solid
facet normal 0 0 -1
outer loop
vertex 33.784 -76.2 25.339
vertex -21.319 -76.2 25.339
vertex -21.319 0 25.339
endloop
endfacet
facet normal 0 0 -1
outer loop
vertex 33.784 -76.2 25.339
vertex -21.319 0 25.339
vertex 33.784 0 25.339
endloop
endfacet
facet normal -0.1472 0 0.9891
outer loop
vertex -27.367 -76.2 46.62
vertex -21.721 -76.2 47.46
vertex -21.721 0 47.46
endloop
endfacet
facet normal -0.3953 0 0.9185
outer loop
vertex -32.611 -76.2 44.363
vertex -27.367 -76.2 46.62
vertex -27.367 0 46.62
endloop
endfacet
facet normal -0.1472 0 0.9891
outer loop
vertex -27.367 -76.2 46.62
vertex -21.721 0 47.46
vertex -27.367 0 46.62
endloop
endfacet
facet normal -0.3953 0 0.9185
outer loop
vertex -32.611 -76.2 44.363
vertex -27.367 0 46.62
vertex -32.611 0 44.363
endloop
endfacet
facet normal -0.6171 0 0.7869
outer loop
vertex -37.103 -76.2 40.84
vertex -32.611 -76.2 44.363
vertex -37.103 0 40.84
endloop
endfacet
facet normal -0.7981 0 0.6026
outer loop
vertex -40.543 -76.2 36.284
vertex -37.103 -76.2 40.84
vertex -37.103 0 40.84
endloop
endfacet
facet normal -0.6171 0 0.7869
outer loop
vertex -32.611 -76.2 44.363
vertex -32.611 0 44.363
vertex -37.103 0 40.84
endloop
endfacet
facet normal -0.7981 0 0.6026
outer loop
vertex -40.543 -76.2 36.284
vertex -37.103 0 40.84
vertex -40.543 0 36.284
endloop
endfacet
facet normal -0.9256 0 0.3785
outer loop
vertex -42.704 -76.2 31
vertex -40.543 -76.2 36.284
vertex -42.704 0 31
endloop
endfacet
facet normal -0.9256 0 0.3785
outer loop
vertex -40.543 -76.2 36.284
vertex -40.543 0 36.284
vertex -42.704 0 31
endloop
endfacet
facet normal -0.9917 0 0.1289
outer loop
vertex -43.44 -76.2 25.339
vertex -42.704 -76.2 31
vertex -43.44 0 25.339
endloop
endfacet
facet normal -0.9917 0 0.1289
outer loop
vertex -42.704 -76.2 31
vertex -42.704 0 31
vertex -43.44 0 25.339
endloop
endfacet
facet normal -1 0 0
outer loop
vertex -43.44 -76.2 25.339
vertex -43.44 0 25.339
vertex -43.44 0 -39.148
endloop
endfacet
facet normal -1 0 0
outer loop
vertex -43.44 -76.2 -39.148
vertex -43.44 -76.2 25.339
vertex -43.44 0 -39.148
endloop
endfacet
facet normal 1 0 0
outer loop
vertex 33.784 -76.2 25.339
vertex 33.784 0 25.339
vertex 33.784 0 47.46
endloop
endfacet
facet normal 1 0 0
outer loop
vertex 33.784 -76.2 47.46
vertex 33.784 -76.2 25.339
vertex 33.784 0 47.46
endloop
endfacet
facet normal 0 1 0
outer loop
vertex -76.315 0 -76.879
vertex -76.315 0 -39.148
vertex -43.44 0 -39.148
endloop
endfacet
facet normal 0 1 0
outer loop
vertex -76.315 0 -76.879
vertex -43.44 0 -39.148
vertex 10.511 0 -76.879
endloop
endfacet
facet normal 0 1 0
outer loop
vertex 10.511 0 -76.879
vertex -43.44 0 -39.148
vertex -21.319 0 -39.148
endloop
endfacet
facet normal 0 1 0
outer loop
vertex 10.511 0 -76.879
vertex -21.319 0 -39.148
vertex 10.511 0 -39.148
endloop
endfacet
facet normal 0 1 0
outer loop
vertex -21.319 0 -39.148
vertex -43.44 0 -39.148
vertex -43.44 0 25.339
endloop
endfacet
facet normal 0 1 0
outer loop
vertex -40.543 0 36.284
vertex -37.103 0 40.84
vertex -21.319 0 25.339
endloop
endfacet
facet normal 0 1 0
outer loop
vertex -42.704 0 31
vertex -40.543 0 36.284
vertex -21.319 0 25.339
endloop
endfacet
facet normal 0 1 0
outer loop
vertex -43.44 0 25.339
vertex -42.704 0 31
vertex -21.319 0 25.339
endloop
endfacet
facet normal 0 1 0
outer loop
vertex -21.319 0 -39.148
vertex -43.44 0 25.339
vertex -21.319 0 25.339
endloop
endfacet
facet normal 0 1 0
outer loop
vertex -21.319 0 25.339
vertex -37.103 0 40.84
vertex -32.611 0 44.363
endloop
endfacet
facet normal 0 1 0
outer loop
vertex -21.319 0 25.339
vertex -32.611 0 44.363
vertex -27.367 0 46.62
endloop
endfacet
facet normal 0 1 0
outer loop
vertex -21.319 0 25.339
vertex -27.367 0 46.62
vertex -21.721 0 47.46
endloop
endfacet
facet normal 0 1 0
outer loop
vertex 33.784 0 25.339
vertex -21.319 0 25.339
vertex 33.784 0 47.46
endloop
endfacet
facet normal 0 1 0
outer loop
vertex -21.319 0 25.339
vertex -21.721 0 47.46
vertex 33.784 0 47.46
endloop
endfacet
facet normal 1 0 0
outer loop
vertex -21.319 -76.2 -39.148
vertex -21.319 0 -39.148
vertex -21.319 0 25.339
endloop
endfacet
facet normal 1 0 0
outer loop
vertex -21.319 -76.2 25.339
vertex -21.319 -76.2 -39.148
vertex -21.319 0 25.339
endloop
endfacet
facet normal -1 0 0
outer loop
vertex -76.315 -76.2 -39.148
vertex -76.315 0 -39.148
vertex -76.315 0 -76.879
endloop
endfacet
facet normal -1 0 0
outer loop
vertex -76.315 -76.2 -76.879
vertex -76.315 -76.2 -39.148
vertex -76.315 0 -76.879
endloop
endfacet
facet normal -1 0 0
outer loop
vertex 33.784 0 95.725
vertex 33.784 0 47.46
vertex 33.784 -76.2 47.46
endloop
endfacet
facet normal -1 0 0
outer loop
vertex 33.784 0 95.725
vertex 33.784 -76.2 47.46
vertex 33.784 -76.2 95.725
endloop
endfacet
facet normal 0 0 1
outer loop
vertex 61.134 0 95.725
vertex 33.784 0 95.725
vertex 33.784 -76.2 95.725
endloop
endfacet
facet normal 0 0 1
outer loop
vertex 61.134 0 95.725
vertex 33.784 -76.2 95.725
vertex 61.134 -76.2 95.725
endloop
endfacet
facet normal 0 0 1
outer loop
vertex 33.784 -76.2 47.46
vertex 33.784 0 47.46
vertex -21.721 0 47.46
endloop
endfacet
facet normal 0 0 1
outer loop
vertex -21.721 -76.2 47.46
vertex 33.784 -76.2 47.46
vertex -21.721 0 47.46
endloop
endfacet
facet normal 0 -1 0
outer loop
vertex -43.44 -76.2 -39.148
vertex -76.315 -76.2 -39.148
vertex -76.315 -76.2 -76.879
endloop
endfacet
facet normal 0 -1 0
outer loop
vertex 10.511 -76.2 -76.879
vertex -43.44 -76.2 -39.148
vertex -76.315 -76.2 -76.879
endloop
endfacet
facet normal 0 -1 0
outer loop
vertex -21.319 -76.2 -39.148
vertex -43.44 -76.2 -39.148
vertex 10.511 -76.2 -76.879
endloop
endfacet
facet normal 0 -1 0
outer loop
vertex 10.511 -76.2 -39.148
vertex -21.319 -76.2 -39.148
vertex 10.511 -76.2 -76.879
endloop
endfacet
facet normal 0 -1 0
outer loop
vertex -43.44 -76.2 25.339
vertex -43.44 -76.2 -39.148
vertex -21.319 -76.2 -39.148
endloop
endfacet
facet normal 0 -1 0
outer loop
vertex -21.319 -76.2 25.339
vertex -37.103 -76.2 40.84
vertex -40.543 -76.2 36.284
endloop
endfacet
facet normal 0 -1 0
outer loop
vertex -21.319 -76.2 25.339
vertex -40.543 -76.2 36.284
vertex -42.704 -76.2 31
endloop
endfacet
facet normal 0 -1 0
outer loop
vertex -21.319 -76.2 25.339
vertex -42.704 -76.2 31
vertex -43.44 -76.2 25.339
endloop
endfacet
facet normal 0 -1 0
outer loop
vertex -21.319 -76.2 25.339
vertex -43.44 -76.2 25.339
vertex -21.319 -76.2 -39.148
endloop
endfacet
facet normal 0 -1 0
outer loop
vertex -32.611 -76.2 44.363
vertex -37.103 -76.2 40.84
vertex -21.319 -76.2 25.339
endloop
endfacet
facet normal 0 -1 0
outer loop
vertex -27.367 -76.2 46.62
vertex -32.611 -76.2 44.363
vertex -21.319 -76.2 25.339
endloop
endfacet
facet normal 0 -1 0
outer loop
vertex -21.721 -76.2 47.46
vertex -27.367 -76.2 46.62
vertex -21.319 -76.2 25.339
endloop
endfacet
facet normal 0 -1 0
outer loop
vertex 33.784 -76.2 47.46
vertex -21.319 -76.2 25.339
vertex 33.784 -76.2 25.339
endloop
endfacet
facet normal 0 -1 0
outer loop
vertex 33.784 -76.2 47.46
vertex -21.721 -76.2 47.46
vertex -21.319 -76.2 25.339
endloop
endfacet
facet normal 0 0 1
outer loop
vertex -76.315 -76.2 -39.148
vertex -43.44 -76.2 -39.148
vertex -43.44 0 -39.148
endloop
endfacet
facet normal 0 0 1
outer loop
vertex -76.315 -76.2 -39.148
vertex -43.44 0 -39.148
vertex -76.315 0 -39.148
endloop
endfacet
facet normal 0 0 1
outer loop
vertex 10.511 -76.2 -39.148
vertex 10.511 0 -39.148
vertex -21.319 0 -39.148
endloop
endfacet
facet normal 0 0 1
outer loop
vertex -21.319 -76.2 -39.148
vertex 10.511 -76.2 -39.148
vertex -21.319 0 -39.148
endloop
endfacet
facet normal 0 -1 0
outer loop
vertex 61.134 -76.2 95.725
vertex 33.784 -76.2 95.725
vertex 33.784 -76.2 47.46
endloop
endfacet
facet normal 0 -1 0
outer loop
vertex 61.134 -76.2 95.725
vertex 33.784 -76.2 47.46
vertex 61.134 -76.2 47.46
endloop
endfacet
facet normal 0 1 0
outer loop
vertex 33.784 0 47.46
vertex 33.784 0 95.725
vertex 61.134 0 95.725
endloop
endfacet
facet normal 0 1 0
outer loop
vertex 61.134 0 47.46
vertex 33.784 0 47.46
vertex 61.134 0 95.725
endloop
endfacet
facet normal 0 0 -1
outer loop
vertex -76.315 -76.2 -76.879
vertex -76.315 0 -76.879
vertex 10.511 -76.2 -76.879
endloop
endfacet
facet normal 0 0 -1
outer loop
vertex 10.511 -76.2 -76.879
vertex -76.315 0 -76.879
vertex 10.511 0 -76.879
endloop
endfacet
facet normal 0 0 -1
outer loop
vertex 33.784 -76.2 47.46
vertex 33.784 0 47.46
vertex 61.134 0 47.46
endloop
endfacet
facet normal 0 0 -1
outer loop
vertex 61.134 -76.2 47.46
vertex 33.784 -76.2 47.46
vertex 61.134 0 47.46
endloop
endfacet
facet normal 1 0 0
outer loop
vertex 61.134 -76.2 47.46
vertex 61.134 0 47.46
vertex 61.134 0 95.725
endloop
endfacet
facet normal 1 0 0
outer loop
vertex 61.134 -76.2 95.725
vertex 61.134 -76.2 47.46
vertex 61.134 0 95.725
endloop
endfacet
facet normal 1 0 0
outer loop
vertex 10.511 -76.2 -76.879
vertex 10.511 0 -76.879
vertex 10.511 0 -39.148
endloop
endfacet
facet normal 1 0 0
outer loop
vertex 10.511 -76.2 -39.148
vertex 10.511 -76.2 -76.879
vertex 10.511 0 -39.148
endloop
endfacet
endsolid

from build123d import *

# Parameters (mm, degrees)
F0_W     = 22.1214885292
F0_H     = 0.2682758373
F1_DEPTH = 76.2
F0_W_2   = 27.350206277
F0_H_2   = 48.2650607879


with BuildPart() as f1:
    # F0 (on Front) → F1 (new body)
    with BuildSketch(Plane.XZ):
        with Locations((-32.3793296038, -39.2825766405)):
            Rectangle(F0_W, F0_H)
        Polygon((-21.3185853392, -39.4167145592), (-43.4400738683, -39.4167145592), (-43.4400738683, -39.1484387219), (-76.3149112463, -39.1484387219), (-76.3149112463, -76.8789947033), (10.5108367279, -76.8789947033), (10.5108367279, -39.1484387219), (-21.3185853392, -39.1484387219), align=None)
        Polygon((-43.4400738683, 25.3389106147), (-43.4400738683, -39.1484387219), (-21.3185853392, -39.1484387219), (-21.3185853392, 25.3389106147), (-21.7207933825, 25.3389106147), align=None)
        with BuildLine():
            ThreePointArc((-21.7207933825, 47.4603974958), (-37.1026154006, 40.8396148459), (-43.4400738683, 25.3389106147))
            Line((-43.4400738683, 25.3389106147), (-21.7207933825, 25.3389106147))
            Line((-21.7207933825, 25.3389106147), (-21.7207933825, 47.4603974958))
        make_face()
        Polygon((-21.7207933825, 25.3389106147), (-21.3185853392, 25.3389106147), (33.7840253699, 25.3389106147), (33.7840253699, 47.4603974958), (-21.7207933825, 47.4603974958), align=None)
    extrude(amount=F1_DEPTH)


with BuildPart() as f1b:
    # F0 (on Front) → F1, piece 2 (new body)
    with BuildSketch(Plane.XZ):
        with Locations((47.4591285084, 71.5929278897)):
            Rectangle(F0_W_2, F0_H_2)
    extrude(amount=F1_DEPTH)


solid = Compound([f1.part, f1b.part])
